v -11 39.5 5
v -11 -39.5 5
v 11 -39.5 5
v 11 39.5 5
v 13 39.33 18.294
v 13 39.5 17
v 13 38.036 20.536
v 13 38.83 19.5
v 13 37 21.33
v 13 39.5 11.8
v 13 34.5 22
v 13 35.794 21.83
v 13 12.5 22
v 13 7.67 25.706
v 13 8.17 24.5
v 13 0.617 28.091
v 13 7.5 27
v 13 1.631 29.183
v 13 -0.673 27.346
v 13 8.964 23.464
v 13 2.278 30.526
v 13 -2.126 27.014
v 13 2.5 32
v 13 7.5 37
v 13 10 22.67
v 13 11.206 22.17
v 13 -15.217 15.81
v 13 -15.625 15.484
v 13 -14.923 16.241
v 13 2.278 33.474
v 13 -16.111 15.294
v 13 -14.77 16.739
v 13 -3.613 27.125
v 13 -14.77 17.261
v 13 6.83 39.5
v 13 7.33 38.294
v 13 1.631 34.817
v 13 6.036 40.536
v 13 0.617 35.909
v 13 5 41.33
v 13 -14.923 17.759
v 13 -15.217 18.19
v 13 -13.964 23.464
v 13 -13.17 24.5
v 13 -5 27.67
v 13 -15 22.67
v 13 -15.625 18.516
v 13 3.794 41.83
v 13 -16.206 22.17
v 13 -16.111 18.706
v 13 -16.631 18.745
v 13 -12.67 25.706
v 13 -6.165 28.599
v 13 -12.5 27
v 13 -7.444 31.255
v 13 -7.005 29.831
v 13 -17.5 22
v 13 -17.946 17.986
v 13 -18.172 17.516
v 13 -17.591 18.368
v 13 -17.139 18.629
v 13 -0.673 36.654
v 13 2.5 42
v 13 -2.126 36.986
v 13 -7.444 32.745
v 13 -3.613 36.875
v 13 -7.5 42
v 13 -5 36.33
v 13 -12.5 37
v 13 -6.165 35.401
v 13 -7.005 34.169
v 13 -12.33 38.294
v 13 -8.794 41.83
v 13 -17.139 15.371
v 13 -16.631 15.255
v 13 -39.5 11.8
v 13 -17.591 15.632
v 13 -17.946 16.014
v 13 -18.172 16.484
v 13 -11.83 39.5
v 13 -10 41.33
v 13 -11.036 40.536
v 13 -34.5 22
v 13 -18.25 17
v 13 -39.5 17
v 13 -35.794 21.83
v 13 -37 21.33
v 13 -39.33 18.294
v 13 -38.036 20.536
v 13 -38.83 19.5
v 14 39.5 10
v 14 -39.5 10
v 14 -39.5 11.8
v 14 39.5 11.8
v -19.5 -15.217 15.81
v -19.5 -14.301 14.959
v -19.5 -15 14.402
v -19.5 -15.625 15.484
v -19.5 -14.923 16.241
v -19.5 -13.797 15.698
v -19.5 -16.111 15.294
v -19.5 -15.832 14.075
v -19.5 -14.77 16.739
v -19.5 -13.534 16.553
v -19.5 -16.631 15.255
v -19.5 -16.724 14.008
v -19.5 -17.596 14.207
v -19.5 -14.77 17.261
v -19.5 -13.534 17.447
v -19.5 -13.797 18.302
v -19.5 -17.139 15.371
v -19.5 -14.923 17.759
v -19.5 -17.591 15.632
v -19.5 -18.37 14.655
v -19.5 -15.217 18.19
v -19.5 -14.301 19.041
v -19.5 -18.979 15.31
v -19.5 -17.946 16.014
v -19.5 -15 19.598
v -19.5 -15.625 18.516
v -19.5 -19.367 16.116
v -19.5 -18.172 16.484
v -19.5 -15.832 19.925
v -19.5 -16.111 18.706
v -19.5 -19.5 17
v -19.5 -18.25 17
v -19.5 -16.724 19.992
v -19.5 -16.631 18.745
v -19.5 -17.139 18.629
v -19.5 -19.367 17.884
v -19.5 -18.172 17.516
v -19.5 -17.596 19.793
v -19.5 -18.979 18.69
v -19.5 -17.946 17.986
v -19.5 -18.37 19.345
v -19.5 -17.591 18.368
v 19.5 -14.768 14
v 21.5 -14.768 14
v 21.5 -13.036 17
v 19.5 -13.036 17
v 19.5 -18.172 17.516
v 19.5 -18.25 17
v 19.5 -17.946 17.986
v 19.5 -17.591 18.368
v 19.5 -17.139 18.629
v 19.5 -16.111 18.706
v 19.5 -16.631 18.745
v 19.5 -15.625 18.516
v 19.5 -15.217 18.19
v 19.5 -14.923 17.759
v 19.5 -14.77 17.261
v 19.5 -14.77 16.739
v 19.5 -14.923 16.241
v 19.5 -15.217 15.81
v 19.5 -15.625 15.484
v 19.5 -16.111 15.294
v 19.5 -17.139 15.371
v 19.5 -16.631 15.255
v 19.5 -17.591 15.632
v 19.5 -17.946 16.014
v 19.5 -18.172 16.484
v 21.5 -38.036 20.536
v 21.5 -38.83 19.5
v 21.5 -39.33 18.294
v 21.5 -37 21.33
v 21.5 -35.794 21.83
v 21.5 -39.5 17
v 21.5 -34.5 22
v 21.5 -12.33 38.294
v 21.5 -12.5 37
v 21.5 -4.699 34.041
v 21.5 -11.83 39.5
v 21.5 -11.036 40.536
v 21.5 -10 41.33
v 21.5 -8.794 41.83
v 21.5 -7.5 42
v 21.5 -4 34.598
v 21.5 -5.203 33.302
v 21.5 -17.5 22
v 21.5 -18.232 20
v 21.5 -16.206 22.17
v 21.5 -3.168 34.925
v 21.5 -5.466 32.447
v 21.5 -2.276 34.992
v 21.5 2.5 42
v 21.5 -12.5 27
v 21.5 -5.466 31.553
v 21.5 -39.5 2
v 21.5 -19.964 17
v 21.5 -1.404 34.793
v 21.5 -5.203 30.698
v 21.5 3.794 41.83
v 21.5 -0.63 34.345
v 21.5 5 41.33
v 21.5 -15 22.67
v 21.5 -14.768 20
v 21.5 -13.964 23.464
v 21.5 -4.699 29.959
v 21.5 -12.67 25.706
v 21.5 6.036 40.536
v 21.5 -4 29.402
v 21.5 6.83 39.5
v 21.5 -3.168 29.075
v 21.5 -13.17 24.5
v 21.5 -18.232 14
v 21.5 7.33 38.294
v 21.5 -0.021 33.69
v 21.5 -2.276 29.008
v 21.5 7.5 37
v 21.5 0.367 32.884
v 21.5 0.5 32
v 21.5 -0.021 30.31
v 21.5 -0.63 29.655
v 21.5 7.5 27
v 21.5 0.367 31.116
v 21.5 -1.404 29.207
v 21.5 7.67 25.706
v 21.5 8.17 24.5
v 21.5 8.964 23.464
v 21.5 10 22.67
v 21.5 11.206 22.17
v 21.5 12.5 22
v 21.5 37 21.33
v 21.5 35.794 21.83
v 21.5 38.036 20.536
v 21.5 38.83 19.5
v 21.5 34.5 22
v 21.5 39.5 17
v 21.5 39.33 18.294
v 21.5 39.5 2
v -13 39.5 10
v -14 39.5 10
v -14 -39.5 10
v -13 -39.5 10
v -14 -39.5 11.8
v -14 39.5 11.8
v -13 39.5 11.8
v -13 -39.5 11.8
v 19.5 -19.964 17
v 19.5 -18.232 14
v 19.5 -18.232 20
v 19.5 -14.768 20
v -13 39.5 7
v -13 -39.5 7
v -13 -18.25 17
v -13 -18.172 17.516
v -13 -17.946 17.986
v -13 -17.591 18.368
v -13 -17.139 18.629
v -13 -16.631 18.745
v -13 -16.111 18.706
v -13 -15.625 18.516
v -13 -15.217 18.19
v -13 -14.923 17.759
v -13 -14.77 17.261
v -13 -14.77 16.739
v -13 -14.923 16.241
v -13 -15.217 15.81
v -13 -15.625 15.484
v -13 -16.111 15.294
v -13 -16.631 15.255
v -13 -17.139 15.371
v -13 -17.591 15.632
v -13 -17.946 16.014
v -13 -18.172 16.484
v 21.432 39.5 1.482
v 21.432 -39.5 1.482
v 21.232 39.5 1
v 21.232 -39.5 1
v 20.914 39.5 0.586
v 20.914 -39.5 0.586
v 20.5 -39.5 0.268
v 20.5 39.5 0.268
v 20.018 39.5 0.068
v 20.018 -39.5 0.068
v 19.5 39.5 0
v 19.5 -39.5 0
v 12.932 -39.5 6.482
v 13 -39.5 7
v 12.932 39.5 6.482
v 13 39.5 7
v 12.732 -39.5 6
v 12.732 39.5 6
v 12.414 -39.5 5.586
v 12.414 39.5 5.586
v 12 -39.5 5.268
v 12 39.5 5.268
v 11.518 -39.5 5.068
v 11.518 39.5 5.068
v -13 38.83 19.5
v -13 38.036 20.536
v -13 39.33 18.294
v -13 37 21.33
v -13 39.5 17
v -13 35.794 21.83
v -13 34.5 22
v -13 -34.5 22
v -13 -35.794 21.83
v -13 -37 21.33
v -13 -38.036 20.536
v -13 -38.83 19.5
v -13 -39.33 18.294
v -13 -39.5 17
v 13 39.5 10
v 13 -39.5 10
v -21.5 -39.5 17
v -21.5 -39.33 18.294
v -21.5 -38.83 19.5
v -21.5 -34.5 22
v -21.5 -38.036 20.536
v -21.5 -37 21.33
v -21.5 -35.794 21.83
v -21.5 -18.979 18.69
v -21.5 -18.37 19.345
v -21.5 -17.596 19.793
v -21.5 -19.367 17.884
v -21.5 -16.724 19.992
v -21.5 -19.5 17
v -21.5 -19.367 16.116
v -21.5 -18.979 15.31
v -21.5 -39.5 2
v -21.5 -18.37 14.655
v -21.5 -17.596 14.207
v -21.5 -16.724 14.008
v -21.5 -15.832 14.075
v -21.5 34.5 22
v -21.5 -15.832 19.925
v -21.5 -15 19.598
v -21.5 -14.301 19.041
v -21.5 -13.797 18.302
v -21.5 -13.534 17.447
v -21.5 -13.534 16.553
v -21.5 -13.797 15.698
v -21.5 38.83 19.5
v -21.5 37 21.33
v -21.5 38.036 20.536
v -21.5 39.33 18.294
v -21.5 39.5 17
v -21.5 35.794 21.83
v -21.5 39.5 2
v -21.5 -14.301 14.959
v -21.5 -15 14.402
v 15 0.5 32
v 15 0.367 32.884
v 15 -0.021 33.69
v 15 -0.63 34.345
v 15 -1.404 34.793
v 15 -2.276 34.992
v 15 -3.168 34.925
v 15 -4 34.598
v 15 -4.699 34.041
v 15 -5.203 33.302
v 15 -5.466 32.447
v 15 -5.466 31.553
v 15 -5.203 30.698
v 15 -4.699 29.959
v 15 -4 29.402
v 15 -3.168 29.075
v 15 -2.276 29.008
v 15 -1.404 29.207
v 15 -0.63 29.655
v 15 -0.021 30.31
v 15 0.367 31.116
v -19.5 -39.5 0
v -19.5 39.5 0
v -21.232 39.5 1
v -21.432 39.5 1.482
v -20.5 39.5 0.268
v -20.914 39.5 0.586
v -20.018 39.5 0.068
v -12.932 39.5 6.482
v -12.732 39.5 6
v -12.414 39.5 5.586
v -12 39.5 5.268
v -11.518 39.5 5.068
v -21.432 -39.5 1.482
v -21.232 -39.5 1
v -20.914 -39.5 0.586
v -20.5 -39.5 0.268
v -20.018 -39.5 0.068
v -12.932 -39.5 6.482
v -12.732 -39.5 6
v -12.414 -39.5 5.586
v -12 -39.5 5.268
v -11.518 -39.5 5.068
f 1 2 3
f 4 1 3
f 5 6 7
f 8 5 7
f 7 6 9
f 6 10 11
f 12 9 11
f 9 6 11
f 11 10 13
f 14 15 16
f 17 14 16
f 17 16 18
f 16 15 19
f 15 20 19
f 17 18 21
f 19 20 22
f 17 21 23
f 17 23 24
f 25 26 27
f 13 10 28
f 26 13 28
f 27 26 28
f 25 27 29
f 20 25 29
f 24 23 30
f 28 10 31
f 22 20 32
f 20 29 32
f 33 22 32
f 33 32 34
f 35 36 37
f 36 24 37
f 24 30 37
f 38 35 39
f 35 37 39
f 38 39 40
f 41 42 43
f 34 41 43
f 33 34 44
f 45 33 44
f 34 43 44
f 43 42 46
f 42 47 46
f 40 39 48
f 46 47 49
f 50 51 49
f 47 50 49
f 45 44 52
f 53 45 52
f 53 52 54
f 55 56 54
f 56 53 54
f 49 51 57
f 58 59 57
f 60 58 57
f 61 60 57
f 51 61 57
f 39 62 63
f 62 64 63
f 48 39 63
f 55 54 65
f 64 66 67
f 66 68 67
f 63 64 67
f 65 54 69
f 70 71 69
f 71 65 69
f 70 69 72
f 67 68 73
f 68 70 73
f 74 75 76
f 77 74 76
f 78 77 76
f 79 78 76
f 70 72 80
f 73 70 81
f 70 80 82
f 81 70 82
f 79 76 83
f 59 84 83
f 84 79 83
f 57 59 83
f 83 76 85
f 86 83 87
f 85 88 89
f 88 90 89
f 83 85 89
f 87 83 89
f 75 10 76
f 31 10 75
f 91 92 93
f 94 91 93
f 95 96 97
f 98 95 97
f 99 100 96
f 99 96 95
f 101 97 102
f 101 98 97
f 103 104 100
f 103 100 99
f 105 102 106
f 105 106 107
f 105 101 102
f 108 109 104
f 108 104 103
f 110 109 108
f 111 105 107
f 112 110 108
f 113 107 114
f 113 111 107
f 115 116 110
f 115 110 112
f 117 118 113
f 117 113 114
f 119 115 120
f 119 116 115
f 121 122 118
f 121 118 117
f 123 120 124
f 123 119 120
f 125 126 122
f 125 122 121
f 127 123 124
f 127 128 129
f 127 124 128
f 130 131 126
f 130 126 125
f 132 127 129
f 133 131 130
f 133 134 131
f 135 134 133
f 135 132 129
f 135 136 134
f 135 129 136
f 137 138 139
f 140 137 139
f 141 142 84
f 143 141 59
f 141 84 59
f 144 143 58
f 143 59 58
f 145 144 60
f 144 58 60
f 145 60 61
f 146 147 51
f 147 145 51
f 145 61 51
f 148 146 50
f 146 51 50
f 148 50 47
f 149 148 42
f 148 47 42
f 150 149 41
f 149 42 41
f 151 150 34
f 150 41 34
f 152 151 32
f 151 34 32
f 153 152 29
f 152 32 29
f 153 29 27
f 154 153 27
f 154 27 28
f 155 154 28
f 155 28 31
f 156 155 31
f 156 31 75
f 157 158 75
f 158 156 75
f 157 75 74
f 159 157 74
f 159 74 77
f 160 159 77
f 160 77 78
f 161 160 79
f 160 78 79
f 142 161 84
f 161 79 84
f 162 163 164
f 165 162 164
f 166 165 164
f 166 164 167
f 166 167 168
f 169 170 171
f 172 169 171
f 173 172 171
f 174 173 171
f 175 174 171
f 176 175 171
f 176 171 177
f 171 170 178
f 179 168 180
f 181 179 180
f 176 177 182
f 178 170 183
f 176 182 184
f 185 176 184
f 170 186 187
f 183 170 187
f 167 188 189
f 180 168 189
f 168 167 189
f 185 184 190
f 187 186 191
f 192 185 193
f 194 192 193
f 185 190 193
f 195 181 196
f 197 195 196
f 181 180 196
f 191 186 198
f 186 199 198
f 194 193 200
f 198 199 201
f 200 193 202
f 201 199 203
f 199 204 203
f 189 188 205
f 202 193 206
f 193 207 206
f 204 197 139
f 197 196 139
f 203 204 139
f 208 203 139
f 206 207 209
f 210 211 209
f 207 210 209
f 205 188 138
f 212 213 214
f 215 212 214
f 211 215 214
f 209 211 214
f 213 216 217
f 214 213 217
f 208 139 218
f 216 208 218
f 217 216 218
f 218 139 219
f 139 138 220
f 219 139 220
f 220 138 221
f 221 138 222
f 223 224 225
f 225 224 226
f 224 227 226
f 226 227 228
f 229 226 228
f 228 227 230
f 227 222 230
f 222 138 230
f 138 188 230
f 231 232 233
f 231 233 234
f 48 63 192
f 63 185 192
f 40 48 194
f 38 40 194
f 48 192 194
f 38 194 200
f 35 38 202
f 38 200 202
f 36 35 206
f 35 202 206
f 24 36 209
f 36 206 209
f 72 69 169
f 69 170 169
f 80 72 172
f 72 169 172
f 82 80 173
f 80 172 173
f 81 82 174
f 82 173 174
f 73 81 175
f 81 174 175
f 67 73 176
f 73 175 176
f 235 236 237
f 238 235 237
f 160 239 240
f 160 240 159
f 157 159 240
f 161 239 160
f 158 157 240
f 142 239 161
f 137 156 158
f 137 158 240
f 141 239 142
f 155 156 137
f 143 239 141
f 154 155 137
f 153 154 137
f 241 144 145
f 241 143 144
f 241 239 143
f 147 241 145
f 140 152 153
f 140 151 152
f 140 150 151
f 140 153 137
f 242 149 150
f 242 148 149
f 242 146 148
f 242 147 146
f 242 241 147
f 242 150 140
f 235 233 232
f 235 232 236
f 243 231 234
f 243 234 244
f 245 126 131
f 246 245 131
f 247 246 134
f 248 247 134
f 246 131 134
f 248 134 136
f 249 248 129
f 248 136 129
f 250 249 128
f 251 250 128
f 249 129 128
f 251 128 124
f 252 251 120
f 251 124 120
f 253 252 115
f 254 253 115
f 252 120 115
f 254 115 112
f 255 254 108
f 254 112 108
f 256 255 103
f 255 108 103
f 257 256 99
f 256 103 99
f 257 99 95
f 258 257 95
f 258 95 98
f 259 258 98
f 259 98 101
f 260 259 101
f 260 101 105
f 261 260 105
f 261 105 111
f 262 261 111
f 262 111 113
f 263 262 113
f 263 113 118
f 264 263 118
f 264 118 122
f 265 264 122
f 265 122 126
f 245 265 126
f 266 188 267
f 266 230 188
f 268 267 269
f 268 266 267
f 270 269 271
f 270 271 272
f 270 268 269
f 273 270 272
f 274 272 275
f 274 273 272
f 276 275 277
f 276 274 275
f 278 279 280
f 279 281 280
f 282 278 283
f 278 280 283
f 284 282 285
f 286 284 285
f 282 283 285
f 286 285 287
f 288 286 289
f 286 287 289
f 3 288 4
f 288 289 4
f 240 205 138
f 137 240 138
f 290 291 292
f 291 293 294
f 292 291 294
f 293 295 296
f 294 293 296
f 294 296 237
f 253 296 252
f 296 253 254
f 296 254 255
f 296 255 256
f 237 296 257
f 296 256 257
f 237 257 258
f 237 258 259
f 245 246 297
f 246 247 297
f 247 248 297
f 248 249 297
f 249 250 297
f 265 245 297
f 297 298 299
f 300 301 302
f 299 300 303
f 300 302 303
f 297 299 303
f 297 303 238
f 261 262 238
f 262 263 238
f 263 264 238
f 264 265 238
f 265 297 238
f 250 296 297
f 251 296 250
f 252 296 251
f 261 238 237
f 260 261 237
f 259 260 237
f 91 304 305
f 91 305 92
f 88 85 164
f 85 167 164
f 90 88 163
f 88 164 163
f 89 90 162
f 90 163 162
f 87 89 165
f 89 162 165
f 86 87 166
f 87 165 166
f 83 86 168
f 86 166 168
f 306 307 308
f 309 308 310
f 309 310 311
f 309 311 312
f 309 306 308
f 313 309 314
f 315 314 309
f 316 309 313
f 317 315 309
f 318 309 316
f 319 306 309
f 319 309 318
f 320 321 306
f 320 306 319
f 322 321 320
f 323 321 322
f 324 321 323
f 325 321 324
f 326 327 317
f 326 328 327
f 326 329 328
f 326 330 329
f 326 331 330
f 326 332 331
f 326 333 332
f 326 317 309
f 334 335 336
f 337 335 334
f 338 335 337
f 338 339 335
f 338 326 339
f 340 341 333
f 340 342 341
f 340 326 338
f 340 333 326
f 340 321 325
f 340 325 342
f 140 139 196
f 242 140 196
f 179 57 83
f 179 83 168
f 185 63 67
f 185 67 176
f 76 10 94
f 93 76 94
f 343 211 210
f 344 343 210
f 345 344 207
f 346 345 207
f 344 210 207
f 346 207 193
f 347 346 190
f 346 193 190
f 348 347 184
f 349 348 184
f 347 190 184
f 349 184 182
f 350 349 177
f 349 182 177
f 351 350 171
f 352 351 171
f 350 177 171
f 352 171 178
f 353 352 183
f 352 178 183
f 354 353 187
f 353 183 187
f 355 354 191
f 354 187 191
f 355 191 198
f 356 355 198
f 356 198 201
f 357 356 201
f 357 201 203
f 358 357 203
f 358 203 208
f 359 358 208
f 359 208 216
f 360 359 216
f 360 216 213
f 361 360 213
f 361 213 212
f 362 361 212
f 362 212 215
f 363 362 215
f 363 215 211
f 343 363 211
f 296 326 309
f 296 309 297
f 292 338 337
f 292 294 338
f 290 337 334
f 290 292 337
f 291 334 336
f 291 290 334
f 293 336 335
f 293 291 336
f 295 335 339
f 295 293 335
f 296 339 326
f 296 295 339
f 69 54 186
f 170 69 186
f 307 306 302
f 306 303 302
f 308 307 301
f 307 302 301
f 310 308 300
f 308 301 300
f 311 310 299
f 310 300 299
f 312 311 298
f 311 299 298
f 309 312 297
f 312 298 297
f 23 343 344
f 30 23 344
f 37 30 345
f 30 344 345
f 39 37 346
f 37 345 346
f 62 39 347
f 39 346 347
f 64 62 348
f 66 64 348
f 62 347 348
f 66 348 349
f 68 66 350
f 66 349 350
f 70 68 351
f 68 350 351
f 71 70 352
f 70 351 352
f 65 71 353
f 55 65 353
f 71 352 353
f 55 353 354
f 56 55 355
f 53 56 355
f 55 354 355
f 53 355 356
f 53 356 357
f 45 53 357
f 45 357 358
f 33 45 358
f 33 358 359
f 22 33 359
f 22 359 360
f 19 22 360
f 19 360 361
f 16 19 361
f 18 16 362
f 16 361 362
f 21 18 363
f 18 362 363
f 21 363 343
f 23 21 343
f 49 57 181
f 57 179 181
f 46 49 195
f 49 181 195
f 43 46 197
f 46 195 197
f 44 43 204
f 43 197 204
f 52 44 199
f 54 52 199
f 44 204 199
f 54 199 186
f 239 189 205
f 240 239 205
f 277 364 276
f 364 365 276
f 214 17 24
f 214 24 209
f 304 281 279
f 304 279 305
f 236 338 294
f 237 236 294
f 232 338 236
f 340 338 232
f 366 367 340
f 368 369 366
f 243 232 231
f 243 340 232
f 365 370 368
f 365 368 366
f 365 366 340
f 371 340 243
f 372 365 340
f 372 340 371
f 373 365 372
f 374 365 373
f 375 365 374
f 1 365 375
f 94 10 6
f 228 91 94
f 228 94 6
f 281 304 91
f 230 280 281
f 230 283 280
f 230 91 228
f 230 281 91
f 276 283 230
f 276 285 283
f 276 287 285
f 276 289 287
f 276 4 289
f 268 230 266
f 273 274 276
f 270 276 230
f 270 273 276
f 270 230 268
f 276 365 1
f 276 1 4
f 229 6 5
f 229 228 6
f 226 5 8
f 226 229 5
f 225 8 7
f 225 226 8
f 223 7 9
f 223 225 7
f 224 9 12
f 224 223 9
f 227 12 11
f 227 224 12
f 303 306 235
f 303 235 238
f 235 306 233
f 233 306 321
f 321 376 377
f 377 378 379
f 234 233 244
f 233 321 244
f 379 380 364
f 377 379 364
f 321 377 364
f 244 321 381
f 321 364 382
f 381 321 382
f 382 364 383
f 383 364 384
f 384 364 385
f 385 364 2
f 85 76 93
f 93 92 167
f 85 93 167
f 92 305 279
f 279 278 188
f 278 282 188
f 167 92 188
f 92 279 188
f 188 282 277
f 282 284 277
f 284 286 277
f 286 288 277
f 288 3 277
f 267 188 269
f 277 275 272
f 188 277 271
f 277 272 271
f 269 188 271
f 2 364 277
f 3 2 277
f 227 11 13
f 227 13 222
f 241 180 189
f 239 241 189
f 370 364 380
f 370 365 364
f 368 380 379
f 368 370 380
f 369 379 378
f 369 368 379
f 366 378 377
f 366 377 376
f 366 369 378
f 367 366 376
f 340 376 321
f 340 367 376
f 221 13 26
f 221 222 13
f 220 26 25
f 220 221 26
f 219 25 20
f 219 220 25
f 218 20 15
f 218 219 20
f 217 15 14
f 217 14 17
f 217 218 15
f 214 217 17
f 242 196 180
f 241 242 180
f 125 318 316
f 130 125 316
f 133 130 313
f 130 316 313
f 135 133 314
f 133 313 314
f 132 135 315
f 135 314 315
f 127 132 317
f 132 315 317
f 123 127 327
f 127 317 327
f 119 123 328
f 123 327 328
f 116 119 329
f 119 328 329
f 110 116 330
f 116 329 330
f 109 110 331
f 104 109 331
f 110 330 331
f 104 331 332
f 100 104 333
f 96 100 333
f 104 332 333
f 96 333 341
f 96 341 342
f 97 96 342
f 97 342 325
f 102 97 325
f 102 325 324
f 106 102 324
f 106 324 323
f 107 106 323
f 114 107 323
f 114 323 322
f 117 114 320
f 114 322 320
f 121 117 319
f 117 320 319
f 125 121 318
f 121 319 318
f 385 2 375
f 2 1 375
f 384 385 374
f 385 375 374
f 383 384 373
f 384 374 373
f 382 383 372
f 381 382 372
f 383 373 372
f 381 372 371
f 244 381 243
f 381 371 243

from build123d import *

# Parameters (mm, degrees)
F0_W      = 43
F0_H      = 79
F0_W_2    = 28
F0_H_2    = 64
F1_DEPTH  = 22
F2_W      = 26
F2_H      = 10.2
F2_H_2    = 1.8
F2_H_3    = 5
F2_W_2    = 1
F3_DEPTH  = 100
F4_R      = 1.75
F5_DEPTH  = 100
F4_R_2    = 3
F6_DEPTH  = 2
F7_R      = 1.75
F8_DEPTH  = 2
F9_W      = 8.5
F9_H      = 20
F10_DEPTH = 20
F11_R     = 3
F12_DEPTH = 25
F13_SIZE  = 2
F14_R     = 5
F15_R     = 2


# Not quite as in the source:
# - a feature names something its author has since deleted; it is built from what else it names


with BuildPart() as f1:
    # F0 (on Top) → F1 (new body)
    with BuildSketch(Plane.XY):
        Rectangle(F0_W, F0_H)
        Rectangle(F0_W_2, F0_H_2, mode=Mode.SUBTRACT)
        Rectangle(F0_W_2, F0_H_2)
    extrude(amount=F1_DEPTH)

    # F2 (on face) → F3 (cut)
    with BuildSketch(Plane.XZ.offset(39.5)):
        with Locations((0, 16.9)):
            Rectangle(F2_W, F2_H)
        with Locations((0, 10.9)):
            Rectangle(F2_W, F2_H_2)
        with Locations((0, 7.5)):
            Rectangle(F2_W, F2_H_3)
        with Locations((-13.5, 10.9)):
            Rectangle(F2_W_2, F2_H_2)
        with Locations((13.5, 10.9)):
            Rectangle(F2_W_2, F2_H_2)
    extrude(amount=-F3_DEPTH, mode=Mode.SUBTRACT)

    # F4 (on face) → F5 (cut)
    with BuildSketch(Plane(origin=(-21.5, 0, 0), x_dir=(0, -1, 0), z_dir=(-1, 0, 0))):
        with Locations((16.5, 17)):
            Circle(F4_R)
    extrude(amount=-F5_DEPTH, mode=Mode.SUBTRACT)

    # F4 (on face) → F6 (cut)
    with BuildSketch(Plane(origin=(-21.5, 0, 0), x_dir=(0, -1, 0), z_dir=(-1, 0, 0))):
        with Locations((16.5, 17)):
            Circle(F4_R_2)
        with Locations((16.5, 17)):
            Circle(F4_R, mode=Mode.SUBTRACT)
    extrude(amount=-F6_DEPTH, mode=Mode.SUBTRACT)

    # F7 (on face) → F8 (cut)
    with BuildSketch(Plane.YZ.offset(21.5)):
        Polygon((-18.2320508076, 14), (-14.7679491924, 14), (-13.0358983849, 17), (-14.7679491924, 20), (-18.2320508076, 20), (-19.9641016151, 17), align=None)
        with Locations((-16.5, 17)):
            Circle(F7_R, mode=Mode.SUBTRACT)
    extrude(amount=-F8_DEPTH, mode=Mode.SUBTRACT)

    # F9 (on face) → F10 (join)
    with BuildSketch(Plane.XY.offset(22)):
        with Locations((17.25, -2.5)):
            Rectangle(F9_W, F9_H)
    extrude(amount=F10_DEPTH)

    # F11 (on face) → F12 (cut)
    with BuildSketch(Plane.YZ.offset(21.5)):
        with Locations((-2.5, 32)):
            Circle(F11_R)
    extrude(amount=-F12_DEPTH, mode=Mode.SUBTRACT)

    # F13
    f13_edges = [f1.edges().sort_by_distance(p)[0] for p in [
        (13, -5.5, 32),
    ]]
    chamfer(f13_edges, length=F13_SIZE)

    # F14
    f14_edges = [f1.edges().sort_by_distance(p)[0] for p in [
        (17.25, 7.5, 42),
        (17.25, -12.5, 42),
        (17.25, -12.5, 22),
        (17.25, 7.5, 22),
        (17.25, 39.5, 22),
        (17.25, -39.5, 22),
        (-17.25, -39.5, 22),
        (-17.25, 39.5, 22),
    ]]
    fillet(f14_edges, radius=F14_R)

    # F15
    f15_edges = [f1.edges().sort_by_distance(p)[0] for p in [
        (13, 0, 5),
        (-13, 0, 5),
        (21.5, 0, 0),
        (-21.5, 0, 0),
    ]]
    fillet(f15_edges, radius=F15_R)


solid = f1.part
